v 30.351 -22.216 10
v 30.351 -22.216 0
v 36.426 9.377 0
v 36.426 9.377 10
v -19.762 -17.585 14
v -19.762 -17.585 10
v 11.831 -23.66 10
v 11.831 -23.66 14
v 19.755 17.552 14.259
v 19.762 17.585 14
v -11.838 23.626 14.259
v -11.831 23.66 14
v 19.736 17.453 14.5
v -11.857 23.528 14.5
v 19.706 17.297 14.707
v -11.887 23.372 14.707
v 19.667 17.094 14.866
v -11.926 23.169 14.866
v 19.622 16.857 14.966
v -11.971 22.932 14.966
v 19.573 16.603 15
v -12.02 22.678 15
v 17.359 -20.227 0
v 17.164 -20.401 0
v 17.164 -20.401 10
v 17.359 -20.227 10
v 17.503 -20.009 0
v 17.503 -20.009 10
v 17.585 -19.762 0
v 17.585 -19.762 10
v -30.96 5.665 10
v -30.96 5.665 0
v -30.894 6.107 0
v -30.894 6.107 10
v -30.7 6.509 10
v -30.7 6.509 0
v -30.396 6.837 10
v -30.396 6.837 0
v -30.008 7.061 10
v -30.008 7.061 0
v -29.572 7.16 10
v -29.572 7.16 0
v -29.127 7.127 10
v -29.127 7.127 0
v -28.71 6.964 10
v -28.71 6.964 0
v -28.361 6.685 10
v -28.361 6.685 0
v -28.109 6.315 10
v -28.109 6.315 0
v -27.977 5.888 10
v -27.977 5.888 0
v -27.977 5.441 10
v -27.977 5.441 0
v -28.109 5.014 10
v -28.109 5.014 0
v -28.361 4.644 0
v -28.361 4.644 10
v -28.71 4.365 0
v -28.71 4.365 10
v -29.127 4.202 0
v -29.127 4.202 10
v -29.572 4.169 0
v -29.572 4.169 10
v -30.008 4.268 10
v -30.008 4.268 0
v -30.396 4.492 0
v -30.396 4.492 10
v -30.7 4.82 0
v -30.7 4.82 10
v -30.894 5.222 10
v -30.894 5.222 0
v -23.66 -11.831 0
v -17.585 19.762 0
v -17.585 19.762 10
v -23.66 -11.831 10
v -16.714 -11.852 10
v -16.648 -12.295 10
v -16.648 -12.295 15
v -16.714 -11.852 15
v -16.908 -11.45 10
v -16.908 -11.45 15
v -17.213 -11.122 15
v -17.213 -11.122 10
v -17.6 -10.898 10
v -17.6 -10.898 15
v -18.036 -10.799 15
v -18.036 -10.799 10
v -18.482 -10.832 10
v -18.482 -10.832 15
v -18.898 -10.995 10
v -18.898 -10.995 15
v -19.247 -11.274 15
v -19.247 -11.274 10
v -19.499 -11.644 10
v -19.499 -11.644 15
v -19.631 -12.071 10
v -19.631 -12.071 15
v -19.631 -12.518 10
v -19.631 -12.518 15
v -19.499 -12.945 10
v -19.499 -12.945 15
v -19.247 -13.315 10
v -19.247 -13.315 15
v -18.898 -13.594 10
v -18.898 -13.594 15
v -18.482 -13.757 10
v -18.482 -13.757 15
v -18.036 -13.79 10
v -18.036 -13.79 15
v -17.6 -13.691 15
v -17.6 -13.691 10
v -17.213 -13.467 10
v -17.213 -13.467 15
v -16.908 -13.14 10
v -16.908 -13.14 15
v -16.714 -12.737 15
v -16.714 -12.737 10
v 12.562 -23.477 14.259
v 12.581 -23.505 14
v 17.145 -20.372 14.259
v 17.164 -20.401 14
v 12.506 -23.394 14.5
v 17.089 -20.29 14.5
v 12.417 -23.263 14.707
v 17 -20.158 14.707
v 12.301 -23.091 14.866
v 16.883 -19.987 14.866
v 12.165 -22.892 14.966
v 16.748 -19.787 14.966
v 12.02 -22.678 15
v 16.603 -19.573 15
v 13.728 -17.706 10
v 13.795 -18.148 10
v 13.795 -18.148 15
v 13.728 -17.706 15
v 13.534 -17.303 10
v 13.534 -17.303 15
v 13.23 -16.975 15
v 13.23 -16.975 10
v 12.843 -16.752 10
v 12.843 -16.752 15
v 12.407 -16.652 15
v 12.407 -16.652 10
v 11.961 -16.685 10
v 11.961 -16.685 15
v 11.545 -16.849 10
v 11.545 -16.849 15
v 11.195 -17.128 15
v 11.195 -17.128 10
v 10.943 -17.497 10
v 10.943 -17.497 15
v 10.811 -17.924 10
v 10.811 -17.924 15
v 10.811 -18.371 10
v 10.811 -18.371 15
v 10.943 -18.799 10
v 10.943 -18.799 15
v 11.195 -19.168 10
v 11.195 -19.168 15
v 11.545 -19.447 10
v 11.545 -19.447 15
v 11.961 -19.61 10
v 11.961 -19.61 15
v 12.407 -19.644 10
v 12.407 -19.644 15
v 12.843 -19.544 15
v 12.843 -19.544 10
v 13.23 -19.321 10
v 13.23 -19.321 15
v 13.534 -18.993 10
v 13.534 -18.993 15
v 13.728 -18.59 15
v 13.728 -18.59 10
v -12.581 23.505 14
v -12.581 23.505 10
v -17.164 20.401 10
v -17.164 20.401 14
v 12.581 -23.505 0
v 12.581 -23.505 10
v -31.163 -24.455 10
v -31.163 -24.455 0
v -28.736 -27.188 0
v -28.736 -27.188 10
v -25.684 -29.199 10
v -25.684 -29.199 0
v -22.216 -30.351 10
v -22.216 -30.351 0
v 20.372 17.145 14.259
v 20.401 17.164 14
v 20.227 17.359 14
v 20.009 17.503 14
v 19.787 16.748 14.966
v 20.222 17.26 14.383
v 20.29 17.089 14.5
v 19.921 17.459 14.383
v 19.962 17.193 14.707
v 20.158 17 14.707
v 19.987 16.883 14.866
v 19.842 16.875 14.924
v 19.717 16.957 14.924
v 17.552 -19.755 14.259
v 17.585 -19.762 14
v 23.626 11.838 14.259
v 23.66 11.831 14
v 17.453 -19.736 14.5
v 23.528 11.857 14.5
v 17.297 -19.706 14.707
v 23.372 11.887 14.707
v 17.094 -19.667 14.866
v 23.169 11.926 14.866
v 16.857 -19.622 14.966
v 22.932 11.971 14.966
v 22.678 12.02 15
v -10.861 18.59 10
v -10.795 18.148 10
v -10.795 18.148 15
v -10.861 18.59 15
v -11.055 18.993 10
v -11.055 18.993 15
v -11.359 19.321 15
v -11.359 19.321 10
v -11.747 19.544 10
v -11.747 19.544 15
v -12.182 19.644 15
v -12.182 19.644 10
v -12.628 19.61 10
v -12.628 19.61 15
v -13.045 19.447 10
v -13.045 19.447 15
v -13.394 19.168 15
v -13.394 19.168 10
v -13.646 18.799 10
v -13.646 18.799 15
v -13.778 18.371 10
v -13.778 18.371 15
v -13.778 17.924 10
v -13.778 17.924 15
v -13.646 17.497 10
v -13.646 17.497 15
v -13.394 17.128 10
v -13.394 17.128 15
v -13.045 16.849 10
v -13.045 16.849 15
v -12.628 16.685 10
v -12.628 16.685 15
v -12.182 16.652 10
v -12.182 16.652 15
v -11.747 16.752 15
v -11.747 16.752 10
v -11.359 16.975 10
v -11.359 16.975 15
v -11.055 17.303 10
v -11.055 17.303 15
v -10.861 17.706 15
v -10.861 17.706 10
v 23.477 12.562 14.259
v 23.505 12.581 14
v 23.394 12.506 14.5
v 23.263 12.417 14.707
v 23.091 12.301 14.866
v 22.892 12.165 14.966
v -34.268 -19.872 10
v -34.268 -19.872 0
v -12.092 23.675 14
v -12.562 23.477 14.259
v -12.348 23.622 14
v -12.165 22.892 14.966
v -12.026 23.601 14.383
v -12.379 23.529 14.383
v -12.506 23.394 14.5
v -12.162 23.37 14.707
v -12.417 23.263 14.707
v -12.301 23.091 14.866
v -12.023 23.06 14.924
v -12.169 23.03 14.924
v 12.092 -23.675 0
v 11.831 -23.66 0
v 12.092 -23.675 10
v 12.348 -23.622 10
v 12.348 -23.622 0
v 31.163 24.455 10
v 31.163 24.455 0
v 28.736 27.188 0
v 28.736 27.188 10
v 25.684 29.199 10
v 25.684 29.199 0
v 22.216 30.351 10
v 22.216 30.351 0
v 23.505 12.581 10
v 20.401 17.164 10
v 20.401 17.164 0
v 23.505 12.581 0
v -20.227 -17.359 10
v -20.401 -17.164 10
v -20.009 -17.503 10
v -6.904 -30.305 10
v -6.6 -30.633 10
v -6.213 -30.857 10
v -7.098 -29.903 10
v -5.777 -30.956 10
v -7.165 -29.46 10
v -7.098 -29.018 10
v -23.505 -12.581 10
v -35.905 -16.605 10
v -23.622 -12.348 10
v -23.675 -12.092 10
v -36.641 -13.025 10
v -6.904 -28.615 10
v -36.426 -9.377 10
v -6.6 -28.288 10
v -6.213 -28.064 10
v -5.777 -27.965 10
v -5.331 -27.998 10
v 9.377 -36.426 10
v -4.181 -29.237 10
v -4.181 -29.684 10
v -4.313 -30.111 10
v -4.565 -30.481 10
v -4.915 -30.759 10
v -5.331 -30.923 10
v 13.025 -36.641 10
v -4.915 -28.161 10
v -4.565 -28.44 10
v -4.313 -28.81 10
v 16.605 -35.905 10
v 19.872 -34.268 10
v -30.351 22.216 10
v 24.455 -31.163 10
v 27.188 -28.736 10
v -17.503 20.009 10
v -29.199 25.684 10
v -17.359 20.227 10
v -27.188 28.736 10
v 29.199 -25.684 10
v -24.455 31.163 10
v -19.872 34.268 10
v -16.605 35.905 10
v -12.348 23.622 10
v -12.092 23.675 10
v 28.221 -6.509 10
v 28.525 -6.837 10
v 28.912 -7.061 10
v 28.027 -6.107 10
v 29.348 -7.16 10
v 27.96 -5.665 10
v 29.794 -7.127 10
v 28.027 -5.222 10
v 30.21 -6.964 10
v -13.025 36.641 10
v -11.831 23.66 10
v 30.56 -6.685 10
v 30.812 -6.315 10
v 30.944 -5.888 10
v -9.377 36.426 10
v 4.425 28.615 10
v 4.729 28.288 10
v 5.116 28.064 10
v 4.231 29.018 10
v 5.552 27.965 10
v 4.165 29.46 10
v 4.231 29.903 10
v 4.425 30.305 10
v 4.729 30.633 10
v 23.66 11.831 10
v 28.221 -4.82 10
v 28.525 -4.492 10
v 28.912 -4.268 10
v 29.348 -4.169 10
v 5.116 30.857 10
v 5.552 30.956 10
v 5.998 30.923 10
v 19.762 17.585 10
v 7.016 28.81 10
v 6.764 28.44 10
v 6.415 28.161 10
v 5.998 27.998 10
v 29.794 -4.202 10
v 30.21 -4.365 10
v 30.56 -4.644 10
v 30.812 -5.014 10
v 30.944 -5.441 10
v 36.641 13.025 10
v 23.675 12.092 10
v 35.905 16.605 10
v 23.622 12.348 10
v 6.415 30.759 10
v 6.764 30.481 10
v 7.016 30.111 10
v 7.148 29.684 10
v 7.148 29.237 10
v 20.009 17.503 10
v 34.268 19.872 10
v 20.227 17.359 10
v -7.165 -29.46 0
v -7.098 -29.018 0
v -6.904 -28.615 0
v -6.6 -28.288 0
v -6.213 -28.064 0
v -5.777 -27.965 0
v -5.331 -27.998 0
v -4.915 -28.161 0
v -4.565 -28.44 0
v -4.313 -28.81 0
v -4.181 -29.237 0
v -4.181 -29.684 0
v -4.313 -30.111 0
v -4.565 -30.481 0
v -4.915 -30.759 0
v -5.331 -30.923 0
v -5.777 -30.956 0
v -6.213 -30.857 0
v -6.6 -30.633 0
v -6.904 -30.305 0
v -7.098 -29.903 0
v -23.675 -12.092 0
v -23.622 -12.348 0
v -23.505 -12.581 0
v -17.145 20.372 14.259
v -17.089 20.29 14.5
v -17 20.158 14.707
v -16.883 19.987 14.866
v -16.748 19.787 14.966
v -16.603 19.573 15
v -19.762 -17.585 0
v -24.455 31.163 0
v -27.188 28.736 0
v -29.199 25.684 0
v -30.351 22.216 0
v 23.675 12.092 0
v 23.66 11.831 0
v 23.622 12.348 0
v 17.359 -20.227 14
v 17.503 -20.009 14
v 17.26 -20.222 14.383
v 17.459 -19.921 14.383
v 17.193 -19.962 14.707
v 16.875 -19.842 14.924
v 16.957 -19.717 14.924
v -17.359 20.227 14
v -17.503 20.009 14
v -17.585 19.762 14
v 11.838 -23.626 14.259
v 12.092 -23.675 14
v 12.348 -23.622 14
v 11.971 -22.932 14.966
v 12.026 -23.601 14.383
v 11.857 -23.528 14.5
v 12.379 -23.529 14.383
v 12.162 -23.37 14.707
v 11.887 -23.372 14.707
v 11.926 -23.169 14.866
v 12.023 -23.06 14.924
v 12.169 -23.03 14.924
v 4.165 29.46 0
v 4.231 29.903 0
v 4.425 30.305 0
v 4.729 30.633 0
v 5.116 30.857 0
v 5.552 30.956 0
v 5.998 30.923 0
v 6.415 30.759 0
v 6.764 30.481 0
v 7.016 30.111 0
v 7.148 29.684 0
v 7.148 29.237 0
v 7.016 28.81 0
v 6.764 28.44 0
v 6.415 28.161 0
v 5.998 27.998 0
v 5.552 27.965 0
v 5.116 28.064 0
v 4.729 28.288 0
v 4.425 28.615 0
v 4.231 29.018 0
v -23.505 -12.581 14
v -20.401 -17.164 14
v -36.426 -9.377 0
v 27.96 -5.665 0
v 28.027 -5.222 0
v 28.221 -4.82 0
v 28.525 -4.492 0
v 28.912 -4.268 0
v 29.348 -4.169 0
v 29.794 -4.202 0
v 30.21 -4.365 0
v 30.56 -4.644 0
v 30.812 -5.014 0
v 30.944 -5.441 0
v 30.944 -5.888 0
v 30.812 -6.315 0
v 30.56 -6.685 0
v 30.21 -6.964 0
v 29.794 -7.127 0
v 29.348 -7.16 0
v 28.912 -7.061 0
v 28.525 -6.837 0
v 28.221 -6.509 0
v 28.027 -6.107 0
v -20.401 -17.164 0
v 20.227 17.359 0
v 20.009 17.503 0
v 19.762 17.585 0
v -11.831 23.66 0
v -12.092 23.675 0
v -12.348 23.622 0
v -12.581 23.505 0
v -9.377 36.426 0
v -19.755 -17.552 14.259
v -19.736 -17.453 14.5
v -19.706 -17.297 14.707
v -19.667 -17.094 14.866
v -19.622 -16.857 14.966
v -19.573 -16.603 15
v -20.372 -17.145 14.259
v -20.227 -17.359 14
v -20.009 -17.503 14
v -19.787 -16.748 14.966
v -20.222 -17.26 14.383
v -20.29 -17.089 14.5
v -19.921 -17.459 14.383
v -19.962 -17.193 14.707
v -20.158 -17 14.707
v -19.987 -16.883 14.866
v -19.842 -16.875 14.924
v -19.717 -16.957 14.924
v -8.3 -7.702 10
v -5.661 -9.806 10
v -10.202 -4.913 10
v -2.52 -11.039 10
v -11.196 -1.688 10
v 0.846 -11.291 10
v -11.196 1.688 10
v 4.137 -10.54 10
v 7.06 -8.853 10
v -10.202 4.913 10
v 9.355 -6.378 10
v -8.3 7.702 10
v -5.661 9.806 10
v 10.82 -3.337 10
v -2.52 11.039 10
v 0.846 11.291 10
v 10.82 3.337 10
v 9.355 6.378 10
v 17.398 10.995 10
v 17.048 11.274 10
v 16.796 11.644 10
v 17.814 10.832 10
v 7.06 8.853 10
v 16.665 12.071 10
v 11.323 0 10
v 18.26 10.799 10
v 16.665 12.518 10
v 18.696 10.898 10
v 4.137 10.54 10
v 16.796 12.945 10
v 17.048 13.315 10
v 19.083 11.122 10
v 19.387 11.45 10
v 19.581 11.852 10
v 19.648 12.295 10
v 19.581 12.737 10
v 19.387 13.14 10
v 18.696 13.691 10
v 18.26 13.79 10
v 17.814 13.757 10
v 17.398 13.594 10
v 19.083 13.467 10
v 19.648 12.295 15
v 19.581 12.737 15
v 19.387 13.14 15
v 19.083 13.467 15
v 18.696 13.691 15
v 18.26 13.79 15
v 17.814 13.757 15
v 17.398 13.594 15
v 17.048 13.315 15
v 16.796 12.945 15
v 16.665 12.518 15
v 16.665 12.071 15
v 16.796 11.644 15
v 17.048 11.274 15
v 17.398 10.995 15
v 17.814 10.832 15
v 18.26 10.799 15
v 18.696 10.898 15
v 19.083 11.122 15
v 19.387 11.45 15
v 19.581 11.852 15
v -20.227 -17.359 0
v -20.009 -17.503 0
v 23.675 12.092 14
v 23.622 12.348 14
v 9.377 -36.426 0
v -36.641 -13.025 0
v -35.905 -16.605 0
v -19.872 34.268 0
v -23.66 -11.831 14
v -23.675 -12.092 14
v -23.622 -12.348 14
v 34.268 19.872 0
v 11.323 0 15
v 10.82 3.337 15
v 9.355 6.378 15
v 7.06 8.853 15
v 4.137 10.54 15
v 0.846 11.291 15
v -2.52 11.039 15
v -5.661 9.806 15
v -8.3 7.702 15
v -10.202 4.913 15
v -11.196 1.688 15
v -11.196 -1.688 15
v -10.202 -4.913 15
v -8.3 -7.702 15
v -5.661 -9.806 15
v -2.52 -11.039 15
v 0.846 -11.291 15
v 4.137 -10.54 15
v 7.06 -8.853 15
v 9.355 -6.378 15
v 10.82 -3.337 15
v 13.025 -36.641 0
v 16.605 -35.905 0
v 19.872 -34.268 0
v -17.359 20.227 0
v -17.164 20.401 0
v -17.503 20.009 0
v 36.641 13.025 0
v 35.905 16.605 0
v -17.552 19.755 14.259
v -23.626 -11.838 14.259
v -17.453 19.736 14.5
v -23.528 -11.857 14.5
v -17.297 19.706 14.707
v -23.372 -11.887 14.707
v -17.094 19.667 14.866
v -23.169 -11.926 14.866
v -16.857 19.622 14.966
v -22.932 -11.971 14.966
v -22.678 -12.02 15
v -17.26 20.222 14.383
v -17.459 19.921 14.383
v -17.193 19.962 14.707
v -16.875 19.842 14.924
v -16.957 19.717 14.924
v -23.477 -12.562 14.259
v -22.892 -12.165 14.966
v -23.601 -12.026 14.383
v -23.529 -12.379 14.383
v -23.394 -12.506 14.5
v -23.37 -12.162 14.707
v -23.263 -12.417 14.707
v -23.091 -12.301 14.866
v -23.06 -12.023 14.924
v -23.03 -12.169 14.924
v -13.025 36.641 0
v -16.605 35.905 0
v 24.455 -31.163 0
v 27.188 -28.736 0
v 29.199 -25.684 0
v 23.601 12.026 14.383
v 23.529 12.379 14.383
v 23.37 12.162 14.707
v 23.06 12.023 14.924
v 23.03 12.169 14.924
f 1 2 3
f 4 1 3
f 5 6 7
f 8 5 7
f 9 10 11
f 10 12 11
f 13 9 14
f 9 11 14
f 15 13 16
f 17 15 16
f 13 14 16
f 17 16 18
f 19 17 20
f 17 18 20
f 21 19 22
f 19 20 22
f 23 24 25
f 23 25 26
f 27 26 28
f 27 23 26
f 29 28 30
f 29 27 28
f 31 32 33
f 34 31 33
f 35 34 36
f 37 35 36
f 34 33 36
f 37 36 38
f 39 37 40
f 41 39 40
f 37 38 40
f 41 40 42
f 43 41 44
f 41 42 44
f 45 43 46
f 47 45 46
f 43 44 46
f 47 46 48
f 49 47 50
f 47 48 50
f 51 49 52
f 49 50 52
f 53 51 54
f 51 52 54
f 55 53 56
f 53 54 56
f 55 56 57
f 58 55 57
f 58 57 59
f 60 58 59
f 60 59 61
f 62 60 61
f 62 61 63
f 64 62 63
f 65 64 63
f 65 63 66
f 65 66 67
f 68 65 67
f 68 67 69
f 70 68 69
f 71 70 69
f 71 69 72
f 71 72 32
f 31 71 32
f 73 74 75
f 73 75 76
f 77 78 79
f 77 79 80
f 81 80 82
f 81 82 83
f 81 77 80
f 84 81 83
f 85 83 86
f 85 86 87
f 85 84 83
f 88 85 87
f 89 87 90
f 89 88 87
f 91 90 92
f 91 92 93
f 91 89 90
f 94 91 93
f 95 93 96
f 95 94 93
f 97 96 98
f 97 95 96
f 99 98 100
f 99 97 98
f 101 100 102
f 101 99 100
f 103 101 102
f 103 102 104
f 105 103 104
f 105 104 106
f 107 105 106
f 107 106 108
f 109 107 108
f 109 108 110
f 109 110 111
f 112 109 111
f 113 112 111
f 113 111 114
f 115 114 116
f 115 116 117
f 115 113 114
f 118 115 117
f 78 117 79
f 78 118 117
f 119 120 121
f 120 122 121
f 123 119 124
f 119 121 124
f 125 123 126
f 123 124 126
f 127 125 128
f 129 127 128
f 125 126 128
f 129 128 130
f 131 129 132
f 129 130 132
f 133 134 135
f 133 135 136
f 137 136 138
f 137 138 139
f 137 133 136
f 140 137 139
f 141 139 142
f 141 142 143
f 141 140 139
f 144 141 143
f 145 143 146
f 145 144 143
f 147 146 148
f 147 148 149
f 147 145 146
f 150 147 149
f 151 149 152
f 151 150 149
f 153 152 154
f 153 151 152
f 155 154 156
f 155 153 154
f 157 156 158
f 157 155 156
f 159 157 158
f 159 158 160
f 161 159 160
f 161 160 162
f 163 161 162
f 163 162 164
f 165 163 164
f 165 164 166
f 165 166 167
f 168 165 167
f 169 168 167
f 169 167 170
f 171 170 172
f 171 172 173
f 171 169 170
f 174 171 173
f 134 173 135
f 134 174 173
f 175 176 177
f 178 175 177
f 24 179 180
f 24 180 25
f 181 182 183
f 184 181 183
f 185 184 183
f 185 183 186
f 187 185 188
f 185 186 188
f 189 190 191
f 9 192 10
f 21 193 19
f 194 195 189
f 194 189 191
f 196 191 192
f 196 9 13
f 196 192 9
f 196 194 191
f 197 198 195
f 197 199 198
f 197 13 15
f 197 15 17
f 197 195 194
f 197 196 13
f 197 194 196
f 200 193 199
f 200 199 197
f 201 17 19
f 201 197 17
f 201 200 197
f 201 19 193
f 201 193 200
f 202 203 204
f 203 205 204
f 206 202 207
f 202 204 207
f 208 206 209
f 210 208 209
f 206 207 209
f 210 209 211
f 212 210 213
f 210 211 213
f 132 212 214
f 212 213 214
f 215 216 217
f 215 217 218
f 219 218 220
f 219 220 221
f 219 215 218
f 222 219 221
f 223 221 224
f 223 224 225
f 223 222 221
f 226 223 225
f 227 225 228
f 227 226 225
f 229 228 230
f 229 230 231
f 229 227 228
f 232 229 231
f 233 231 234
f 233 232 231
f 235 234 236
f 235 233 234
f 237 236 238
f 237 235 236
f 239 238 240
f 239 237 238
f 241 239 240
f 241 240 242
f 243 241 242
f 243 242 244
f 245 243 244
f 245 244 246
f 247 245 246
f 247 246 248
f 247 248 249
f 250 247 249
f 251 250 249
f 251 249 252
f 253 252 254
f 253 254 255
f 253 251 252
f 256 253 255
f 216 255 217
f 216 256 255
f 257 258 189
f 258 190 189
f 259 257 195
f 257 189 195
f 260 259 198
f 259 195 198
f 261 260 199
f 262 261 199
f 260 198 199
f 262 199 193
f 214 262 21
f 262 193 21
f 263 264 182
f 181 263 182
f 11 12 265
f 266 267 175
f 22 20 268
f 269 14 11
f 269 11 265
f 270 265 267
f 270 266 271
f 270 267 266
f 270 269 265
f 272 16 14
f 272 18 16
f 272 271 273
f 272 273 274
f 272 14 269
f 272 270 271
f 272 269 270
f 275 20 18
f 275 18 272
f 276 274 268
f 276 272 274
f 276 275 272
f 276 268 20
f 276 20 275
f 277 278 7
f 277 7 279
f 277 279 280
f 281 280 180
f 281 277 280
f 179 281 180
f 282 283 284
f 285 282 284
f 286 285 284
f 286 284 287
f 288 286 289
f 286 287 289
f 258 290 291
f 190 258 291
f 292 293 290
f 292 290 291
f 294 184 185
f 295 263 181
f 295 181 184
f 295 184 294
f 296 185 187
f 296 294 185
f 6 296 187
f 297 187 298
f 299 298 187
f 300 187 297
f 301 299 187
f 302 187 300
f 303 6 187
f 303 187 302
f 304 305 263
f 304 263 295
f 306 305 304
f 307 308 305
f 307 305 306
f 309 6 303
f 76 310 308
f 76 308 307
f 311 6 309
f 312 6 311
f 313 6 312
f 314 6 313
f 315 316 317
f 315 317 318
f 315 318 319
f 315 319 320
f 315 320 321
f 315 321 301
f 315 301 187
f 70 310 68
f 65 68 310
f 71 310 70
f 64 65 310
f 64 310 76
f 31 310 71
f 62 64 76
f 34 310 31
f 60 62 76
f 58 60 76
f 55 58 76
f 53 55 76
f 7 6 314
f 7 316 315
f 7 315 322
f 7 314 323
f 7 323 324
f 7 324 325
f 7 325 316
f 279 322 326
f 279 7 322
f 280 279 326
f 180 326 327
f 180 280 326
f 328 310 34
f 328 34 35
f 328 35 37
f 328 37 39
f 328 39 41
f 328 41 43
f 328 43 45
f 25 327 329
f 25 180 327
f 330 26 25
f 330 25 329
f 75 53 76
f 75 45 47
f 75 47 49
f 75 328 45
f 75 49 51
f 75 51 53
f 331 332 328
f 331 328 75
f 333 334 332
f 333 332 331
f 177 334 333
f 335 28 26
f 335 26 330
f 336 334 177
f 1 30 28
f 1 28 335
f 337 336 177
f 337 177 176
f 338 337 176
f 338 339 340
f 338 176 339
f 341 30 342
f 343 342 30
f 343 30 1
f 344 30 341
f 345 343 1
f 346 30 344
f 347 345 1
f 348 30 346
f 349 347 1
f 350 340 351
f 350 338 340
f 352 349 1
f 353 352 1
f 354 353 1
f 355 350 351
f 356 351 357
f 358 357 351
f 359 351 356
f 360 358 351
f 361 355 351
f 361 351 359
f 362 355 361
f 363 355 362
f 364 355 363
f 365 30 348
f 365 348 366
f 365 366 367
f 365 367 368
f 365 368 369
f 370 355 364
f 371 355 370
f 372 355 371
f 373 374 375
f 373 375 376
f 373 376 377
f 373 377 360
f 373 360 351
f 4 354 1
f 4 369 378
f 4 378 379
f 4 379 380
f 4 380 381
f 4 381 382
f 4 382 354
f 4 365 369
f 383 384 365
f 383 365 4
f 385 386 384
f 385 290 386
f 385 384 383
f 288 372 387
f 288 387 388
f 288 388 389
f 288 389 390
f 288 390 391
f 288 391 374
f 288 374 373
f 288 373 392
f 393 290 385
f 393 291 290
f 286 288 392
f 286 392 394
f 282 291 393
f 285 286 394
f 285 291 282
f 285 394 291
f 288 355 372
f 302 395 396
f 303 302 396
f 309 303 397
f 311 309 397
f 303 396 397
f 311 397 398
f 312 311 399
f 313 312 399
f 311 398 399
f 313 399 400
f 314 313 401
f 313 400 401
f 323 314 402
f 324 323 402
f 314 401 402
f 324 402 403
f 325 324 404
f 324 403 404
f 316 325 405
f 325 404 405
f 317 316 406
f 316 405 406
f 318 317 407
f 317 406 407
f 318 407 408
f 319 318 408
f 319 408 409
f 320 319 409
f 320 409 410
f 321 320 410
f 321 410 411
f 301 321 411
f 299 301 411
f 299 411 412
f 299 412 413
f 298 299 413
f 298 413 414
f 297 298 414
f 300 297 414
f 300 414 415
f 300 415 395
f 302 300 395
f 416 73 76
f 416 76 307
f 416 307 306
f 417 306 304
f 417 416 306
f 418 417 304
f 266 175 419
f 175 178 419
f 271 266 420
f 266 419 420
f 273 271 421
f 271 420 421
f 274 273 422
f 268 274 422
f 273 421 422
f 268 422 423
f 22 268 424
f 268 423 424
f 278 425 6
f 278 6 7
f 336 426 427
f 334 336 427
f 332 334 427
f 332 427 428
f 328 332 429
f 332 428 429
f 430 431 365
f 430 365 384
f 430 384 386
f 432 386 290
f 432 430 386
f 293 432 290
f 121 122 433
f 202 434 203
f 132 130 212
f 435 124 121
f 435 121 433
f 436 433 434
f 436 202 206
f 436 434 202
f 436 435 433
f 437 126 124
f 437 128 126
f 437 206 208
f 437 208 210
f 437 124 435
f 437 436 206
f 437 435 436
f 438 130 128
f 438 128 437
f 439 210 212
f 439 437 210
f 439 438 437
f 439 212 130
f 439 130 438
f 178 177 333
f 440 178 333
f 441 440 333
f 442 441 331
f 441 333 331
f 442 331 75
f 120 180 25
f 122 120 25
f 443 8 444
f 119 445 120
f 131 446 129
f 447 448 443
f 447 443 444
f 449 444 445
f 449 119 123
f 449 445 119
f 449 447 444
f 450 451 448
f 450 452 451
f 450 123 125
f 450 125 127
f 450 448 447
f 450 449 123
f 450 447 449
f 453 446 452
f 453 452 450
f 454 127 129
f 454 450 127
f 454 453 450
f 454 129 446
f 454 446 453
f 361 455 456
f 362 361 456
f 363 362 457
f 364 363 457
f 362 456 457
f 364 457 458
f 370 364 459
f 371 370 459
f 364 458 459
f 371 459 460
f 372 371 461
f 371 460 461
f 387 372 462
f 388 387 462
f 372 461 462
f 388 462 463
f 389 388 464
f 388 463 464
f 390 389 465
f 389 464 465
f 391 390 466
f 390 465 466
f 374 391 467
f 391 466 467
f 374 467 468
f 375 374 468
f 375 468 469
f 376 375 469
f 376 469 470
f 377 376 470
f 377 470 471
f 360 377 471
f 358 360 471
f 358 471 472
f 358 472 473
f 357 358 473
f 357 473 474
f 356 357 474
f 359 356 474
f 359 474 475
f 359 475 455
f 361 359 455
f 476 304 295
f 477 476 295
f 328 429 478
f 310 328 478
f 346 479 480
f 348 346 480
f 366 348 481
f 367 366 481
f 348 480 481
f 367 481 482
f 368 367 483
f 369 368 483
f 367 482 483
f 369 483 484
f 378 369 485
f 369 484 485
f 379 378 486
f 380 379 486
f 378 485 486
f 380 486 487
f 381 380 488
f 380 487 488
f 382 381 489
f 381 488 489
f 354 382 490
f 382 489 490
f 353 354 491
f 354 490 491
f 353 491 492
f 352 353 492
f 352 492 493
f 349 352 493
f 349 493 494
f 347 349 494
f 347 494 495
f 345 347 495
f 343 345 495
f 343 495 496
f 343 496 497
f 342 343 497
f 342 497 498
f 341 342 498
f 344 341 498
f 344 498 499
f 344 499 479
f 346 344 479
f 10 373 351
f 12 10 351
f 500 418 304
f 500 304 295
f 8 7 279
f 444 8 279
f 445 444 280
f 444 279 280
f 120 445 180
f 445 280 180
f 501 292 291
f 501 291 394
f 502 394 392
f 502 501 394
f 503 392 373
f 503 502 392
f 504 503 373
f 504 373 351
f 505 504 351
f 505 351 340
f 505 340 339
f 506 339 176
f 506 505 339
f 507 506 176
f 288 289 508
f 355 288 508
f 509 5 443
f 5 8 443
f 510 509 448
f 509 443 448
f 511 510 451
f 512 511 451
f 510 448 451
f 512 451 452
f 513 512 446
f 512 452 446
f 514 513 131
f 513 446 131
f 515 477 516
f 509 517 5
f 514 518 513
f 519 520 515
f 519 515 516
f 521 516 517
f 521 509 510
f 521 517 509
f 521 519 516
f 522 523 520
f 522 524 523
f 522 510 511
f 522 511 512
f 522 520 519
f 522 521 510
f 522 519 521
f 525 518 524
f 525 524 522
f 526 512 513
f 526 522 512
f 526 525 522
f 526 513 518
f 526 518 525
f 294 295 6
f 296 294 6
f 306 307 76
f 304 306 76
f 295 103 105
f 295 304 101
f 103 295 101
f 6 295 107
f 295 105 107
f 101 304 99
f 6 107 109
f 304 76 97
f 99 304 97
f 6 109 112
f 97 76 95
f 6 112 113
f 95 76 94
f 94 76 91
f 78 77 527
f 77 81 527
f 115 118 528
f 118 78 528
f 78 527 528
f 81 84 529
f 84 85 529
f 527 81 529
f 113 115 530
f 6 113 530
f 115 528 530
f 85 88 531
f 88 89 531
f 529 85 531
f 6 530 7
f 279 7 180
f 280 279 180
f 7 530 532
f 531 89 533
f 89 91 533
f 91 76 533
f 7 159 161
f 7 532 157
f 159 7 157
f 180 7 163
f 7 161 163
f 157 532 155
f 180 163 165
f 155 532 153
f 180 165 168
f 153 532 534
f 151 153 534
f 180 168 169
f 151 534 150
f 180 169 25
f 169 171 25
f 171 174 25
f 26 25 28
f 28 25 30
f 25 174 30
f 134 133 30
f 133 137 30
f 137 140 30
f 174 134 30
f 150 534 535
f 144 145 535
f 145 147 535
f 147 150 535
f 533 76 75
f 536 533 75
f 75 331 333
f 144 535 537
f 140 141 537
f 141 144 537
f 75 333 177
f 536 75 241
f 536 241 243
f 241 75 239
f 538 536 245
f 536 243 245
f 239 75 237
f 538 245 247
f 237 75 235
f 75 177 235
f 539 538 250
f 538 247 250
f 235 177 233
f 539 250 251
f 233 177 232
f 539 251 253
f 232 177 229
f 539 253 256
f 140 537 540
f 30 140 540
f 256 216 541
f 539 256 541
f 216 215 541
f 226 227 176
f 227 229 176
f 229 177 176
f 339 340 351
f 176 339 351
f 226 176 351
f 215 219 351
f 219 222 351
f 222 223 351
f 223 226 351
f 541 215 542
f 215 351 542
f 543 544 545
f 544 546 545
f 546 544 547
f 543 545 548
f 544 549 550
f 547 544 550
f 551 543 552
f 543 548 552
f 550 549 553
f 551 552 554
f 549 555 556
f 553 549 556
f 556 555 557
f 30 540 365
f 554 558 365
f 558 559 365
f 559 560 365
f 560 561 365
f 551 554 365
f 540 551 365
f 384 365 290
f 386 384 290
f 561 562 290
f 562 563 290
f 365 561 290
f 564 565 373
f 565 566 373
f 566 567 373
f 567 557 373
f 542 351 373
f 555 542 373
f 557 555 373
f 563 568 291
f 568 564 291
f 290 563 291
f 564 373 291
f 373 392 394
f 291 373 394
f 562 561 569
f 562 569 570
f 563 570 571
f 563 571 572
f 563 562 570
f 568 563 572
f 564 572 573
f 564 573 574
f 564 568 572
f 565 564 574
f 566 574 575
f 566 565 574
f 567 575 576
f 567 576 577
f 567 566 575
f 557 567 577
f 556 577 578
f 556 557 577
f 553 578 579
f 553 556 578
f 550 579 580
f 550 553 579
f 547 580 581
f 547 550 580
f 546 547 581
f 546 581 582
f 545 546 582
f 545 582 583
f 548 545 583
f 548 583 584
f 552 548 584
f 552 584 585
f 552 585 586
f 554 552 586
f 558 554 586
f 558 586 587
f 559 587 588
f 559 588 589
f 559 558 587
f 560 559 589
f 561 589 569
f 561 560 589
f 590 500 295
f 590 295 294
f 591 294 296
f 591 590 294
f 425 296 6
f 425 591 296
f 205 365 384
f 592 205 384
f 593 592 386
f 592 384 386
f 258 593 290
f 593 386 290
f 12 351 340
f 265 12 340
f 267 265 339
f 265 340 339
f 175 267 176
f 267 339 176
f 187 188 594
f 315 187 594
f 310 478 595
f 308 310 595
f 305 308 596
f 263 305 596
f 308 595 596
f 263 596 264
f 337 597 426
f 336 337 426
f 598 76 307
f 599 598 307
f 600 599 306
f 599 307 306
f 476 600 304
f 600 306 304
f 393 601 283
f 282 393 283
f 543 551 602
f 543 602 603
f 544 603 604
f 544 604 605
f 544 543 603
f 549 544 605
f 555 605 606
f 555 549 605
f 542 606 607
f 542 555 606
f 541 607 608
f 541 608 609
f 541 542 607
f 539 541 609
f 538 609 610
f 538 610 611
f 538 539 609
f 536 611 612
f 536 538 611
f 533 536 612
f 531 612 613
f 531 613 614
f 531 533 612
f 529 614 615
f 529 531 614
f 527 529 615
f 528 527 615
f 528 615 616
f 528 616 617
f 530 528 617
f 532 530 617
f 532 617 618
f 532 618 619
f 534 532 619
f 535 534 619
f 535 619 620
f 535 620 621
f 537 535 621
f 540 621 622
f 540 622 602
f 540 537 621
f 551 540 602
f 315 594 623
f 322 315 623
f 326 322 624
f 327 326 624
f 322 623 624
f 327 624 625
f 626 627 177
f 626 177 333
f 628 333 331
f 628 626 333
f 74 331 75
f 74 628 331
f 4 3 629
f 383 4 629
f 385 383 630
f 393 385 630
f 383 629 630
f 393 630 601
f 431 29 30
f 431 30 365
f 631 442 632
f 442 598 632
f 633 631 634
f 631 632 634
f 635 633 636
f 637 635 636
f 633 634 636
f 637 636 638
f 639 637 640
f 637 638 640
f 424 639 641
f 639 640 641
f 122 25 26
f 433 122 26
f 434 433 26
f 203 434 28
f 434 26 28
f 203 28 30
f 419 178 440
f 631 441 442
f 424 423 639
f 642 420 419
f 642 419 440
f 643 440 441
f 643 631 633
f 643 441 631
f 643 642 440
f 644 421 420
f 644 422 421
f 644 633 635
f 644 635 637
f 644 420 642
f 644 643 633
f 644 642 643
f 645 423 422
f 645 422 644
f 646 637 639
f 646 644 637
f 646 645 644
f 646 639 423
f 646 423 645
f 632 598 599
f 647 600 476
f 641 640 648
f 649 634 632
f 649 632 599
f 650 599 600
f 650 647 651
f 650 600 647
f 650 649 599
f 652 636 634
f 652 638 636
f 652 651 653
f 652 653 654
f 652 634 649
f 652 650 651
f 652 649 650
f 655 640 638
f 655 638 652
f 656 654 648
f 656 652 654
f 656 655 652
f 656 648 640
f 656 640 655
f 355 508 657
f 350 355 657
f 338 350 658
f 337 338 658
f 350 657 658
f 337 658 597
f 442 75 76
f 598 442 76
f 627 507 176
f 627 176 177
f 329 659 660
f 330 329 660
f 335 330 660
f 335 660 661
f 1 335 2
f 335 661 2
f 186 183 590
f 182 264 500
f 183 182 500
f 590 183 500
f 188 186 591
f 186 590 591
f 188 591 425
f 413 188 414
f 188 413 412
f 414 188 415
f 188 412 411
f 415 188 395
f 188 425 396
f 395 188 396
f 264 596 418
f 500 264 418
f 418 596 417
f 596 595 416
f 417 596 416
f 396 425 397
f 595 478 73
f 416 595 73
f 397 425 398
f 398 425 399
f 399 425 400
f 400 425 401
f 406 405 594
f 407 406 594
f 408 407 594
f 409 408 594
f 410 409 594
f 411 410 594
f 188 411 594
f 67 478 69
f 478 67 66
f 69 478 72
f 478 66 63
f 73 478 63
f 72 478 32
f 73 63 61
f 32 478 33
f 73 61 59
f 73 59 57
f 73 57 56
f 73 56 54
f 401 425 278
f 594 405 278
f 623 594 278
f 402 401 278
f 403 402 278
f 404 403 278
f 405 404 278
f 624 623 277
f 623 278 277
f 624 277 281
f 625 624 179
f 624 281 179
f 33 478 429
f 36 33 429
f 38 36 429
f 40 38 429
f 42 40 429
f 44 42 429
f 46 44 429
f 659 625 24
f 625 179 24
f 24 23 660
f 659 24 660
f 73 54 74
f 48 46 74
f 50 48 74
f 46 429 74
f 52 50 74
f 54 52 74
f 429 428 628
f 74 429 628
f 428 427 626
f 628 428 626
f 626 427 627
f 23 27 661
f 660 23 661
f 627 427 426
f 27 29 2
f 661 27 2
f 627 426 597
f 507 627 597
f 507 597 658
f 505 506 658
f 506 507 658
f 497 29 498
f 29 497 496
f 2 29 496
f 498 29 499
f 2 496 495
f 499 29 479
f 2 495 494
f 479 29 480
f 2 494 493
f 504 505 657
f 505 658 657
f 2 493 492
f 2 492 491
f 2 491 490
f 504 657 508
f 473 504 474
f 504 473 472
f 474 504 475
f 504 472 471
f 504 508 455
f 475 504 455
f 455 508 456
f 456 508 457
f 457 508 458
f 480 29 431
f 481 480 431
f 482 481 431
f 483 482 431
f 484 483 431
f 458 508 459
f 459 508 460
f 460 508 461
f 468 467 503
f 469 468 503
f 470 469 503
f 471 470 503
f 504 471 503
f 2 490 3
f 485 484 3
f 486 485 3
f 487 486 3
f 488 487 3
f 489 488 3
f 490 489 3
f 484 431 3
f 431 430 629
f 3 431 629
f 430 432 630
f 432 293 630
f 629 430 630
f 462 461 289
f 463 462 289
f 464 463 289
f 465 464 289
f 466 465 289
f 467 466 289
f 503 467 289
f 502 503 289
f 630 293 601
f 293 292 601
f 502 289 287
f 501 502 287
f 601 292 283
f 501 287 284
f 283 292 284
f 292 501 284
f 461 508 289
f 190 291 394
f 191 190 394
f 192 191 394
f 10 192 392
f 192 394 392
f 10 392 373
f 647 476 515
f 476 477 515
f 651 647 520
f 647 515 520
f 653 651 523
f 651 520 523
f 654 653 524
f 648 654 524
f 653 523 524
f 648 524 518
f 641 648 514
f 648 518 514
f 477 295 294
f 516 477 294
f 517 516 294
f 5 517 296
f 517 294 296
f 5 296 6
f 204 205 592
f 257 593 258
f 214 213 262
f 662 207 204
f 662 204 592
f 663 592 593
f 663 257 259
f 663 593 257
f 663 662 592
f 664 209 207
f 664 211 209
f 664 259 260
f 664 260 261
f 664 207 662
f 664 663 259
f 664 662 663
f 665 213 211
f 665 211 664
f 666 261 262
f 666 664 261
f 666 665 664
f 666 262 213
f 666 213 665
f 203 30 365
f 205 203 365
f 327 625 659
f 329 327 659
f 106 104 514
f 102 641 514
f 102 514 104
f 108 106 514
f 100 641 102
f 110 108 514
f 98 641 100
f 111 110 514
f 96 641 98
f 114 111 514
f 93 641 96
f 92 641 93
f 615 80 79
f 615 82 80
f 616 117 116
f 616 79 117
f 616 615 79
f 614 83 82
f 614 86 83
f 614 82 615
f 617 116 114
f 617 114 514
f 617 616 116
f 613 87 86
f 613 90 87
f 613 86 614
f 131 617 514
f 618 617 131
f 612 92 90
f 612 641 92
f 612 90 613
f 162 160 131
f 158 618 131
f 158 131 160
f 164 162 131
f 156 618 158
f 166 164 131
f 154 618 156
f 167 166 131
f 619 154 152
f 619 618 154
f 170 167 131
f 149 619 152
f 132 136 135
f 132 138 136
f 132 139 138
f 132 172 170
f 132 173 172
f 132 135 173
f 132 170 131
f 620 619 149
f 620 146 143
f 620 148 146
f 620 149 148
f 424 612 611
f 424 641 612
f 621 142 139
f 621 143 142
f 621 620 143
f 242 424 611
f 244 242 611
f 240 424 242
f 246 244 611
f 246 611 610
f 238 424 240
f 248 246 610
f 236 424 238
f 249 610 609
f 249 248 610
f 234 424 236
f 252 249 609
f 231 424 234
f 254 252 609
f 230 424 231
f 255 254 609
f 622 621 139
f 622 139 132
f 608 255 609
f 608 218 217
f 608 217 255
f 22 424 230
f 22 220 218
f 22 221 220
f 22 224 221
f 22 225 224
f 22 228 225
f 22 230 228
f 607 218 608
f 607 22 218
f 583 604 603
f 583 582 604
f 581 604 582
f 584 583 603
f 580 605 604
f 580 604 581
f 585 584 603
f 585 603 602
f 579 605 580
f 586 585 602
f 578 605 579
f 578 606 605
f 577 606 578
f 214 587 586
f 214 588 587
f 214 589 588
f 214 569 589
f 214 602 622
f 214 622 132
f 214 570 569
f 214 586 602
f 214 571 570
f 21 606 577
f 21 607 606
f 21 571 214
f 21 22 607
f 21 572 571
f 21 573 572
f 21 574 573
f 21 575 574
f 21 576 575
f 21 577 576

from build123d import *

# Parameters (mm, degrees)
BOSS_EXTRU_1_DEPTH      = 10
ESQUISSE4_R             = 1.5
ENL_V_MAT_EXTRU_1_DEPTH = 53.824995602
ESQUISSE5_R             = 1.5
ESQUISSE5_R_2           = 11.32290571
BOSS_EXTRU_2_DEPTH      = 5
CONG_3_R                = 1


with BuildPart() as part:
    # Esquisse2 → Boss.-Extru.1 (new body)
    with BuildSketch(Plane.XY):
        with BuildLine():
            Line((30.351150978, -22.216214596), (36.425687048, 9.37666677))
            ThreePointArc((36.425687048, 9.37666677), (36.390769011, 14.839084183), (34.268132307, 19.872337274))
            Line((34.268132307, 19.872337274), (31.163395971, 24.45521278))
            ThreePointArc((31.163395971, 24.45521278), (27.276192796, 28.293034393), (22.216214596, 30.351150978))
            Line((22.216214596, 30.351150978), (-9.37666677, 36.425687048))
            ThreePointArc((-9.37666677, 36.425687048), (-14.839084183, 36.390769011), (-19.872337274, 34.268132307))
            Line((-19.872337274, 34.268132307), (-24.45521278, 31.163395971))
            ThreePointArc((-24.45521278, 31.163395971), (-28.293034393, 27.276192796), (-30.351150978, 22.216214596))
            Line((-30.351150978, 22.216214596), (-36.425687048, -9.37666677))
            ThreePointArc((-36.425687048, -9.37666677), (-36.390769011, -14.839084183), (-34.268132307, -19.872337274))
            Line((-34.268132307, -19.872337274), (-31.163395971, -24.45521278))
            ThreePointArc((-31.163395971, -24.45521278), (-27.276192796, -28.293034393), (-22.216214596, -30.351150978))
            Line((-22.216214596, -30.351150978), (9.37666677, -36.425687048))
            ThreePointArc((9.37666677, -36.425687048), (14.839084183, -36.390769011), (19.872337274, -34.268132307))
            Line((19.872337274, -34.268132307), (24.45521278, -31.163395971))
            ThreePointArc((24.45521278, -31.163395971), (28.293034393, -27.276192796), (30.351150978, -22.216214596))
        make_face()
        with BuildLine():
            Line((19.761595182, 17.584990884), (-11.831286185, 23.659526955))
            ThreePointArc((-11.831286185, 23.659526955), (-12.221458858, 23.657032809), (-12.580976935, 23.505415902))
            Line((-12.580976935, 23.505415902), (-17.163852442, 20.400679566))
            ThreePointArc((-17.163852442, 20.400679566), (-17.437982557, 20.123022196), (-17.584990884, 19.761595182))
            Line((-17.584990884, 19.761595182), (-23.659526955, -11.831286185))
            ThreePointArc((-23.659526955, -11.831286185), (-23.657032809, -12.221458858), (-23.505415902, -12.580976935))
            Line((-23.505415902, -12.580976935), (-20.400679566, -17.163852442))
            ThreePointArc((-20.400679566, -17.163852442), (-20.123022196, -17.437982557), (-19.761595182, -17.584990884))
            Line((-19.761595182, -17.584990884), (11.831286185, -23.659526955))
            ThreePointArc((11.831286185, -23.659526955), (12.221458858, -23.657032809), (12.580976935, -23.505415902))
            Line((12.580976935, -23.505415902), (17.163852442, -20.400679566))
            ThreePointArc((17.163852442, -20.400679566), (17.437982557, -20.123022196), (17.584990884, -19.761595182))
            Line((17.584990884, -19.761595182), (23.659526955, 11.831286185))
            ThreePointArc((23.659526955, 11.831286185), (23.657032809, 12.221458858), (23.505415902, 12.580976935))
            Line((23.505415902, 12.580976935), (20.400679566, 17.163852442))
            ThreePointArc((20.400679566, 17.163852442), (20.123022196, 17.437982557), (19.761595182, 17.584990884))
        make_face(mode=Mode.SUBTRACT)
    extrude(amount=BOSS_EXTRU_1_DEPTH)

    # Esquisse4 → Enlèv. mat.-Extru.1 (cut, through all)
    with BuildSketch(Plane(origin=(0, 0, 0), x_dir=(-1, 0, 0), z_dir=(0, 0, -1))):
        with Locations((29.460369753, 5.664506401)):
            Circle(ESQUISSE4_R)
        with Locations((5.664506401, -29.460369753)):
            Circle(ESQUISSE4_R)
        with Locations((-29.460369753, -5.664506401)):
            Circle(ESQUISSE4_R)
        with Locations((-5.664506401, 29.460369753)):
            Circle(ESQUISSE4_R)
    extrude(amount=-ENL_V_MAT_EXTRU_1_DEPTH, mode=Mode.SUBTRACT)


with BuildPart() as body_2:
    # Esquisse5 → Boss.-Extru.2 (new body)
    with BuildSketch(Plane.XY.offset(10)):
        with BuildLine():
            ThreePointArc((17.163852442, -20.400679566), (17.437982557, -20.123022196), (17.584990884, -19.761595182))
            Line((17.584990884, -19.761595182), (23.659526955, 11.831286185))
            ThreePointArc((23.659526955, 11.831286185), (23.657032809, 12.221458858), (23.505415902, 12.580976935))
            Line((23.505415902, 12.580976935), (20.400679566, 17.163852442))
            ThreePointArc((20.400679566, 17.163852442), (20.123022196, 17.437982557), (19.761595182, 17.584990884))
            Line((19.761595182, 17.584990884), (-11.831286185, 23.659526955))
            ThreePointArc((-11.831286185, 23.659526955), (-12.221458858, 23.657032809), (-12.580976935, 23.505415902))
            Line((-12.580976935, 23.505415902), (-17.163852442, 20.400679566))
            ThreePointArc((-17.163852442, 20.400679566), (-17.437982557, 20.123022196), (-17.584990884, 19.761595182))
            Line((-17.584990884, 19.761595182), (-23.659526955, -11.831286185))
            ThreePointArc((-23.659526955, -11.831286185), (-23.657032809, -12.221458858), (-23.505415902, -12.580976935))
            Line((-23.505415902, -12.580976935), (-20.400679566, -17.163852442))
            ThreePointArc((-20.400679566, -17.163852442), (-20.123022196, -17.437982557), (-19.761595182, -17.584990884))
            Line((-19.761595182, -17.584990884), (11.831286185, -23.659526955))
            ThreePointArc((11.831286185, -23.659526955), (12.221458858, -23.657032809), (12.580976935, -23.505415902))
            Line((12.580976935, -23.505415902), (17.163852442, -20.400679566))
        make_face()
        with Locations((-18.14785249, -12.294529271)):
            Circle(ESQUISSE5_R, mode=Mode.SUBTRACT)
        with Locations((12.294529271, -18.14785249)):
            Circle(ESQUISSE5_R, mode=Mode.SUBTRACT)
        Circle(ESQUISSE5_R_2, mode=Mode.SUBTRACT)
        with Locations((-12.294529271, 18.14785249)):
            Circle(ESQUISSE5_R, mode=Mode.SUBTRACT)
        with Locations((18.14785249, 12.294529271)):
            Circle(ESQUISSE5_R, mode=Mode.SUBTRACT)
    extrude(amount=BOSS_EXTRU_2_DEPTH)

    # Congé3
    cong_3_edges = [body_2.edges().sort_by_distance(p)[0] for p in [
        (17.437982557, -20.123022196, 15),
        (20.62225892, -3.965154498, 15),
        (23.657032809, 12.221458858, 15),
        (21.953047734, 14.872414689, 15),
        (20.123022196, 17.437982557, 15),
        (3.965154498, 20.62225892, 15),
        (-12.221458858, 23.657032809, 15),
        (-14.872414689, 21.953047734, 15),
        (-17.437982557, 20.123022196, 15),
        (-20.62225892, 3.965154498, 15),
        (-23.657032809, -12.221458858, 15),
        (-21.953047734, -14.872414689, 15),
        (-20.123022196, -17.437982557, 15),
        (-3.965154498, -20.62225892, 15),
        (12.221458858, -23.657032809, 15),
        (14.872414689, -21.953047734, 15),
    ]]
    fillet(cong_3_edges, radius=CONG_3_R)


solid = Compound([part.part, body_2.part])
